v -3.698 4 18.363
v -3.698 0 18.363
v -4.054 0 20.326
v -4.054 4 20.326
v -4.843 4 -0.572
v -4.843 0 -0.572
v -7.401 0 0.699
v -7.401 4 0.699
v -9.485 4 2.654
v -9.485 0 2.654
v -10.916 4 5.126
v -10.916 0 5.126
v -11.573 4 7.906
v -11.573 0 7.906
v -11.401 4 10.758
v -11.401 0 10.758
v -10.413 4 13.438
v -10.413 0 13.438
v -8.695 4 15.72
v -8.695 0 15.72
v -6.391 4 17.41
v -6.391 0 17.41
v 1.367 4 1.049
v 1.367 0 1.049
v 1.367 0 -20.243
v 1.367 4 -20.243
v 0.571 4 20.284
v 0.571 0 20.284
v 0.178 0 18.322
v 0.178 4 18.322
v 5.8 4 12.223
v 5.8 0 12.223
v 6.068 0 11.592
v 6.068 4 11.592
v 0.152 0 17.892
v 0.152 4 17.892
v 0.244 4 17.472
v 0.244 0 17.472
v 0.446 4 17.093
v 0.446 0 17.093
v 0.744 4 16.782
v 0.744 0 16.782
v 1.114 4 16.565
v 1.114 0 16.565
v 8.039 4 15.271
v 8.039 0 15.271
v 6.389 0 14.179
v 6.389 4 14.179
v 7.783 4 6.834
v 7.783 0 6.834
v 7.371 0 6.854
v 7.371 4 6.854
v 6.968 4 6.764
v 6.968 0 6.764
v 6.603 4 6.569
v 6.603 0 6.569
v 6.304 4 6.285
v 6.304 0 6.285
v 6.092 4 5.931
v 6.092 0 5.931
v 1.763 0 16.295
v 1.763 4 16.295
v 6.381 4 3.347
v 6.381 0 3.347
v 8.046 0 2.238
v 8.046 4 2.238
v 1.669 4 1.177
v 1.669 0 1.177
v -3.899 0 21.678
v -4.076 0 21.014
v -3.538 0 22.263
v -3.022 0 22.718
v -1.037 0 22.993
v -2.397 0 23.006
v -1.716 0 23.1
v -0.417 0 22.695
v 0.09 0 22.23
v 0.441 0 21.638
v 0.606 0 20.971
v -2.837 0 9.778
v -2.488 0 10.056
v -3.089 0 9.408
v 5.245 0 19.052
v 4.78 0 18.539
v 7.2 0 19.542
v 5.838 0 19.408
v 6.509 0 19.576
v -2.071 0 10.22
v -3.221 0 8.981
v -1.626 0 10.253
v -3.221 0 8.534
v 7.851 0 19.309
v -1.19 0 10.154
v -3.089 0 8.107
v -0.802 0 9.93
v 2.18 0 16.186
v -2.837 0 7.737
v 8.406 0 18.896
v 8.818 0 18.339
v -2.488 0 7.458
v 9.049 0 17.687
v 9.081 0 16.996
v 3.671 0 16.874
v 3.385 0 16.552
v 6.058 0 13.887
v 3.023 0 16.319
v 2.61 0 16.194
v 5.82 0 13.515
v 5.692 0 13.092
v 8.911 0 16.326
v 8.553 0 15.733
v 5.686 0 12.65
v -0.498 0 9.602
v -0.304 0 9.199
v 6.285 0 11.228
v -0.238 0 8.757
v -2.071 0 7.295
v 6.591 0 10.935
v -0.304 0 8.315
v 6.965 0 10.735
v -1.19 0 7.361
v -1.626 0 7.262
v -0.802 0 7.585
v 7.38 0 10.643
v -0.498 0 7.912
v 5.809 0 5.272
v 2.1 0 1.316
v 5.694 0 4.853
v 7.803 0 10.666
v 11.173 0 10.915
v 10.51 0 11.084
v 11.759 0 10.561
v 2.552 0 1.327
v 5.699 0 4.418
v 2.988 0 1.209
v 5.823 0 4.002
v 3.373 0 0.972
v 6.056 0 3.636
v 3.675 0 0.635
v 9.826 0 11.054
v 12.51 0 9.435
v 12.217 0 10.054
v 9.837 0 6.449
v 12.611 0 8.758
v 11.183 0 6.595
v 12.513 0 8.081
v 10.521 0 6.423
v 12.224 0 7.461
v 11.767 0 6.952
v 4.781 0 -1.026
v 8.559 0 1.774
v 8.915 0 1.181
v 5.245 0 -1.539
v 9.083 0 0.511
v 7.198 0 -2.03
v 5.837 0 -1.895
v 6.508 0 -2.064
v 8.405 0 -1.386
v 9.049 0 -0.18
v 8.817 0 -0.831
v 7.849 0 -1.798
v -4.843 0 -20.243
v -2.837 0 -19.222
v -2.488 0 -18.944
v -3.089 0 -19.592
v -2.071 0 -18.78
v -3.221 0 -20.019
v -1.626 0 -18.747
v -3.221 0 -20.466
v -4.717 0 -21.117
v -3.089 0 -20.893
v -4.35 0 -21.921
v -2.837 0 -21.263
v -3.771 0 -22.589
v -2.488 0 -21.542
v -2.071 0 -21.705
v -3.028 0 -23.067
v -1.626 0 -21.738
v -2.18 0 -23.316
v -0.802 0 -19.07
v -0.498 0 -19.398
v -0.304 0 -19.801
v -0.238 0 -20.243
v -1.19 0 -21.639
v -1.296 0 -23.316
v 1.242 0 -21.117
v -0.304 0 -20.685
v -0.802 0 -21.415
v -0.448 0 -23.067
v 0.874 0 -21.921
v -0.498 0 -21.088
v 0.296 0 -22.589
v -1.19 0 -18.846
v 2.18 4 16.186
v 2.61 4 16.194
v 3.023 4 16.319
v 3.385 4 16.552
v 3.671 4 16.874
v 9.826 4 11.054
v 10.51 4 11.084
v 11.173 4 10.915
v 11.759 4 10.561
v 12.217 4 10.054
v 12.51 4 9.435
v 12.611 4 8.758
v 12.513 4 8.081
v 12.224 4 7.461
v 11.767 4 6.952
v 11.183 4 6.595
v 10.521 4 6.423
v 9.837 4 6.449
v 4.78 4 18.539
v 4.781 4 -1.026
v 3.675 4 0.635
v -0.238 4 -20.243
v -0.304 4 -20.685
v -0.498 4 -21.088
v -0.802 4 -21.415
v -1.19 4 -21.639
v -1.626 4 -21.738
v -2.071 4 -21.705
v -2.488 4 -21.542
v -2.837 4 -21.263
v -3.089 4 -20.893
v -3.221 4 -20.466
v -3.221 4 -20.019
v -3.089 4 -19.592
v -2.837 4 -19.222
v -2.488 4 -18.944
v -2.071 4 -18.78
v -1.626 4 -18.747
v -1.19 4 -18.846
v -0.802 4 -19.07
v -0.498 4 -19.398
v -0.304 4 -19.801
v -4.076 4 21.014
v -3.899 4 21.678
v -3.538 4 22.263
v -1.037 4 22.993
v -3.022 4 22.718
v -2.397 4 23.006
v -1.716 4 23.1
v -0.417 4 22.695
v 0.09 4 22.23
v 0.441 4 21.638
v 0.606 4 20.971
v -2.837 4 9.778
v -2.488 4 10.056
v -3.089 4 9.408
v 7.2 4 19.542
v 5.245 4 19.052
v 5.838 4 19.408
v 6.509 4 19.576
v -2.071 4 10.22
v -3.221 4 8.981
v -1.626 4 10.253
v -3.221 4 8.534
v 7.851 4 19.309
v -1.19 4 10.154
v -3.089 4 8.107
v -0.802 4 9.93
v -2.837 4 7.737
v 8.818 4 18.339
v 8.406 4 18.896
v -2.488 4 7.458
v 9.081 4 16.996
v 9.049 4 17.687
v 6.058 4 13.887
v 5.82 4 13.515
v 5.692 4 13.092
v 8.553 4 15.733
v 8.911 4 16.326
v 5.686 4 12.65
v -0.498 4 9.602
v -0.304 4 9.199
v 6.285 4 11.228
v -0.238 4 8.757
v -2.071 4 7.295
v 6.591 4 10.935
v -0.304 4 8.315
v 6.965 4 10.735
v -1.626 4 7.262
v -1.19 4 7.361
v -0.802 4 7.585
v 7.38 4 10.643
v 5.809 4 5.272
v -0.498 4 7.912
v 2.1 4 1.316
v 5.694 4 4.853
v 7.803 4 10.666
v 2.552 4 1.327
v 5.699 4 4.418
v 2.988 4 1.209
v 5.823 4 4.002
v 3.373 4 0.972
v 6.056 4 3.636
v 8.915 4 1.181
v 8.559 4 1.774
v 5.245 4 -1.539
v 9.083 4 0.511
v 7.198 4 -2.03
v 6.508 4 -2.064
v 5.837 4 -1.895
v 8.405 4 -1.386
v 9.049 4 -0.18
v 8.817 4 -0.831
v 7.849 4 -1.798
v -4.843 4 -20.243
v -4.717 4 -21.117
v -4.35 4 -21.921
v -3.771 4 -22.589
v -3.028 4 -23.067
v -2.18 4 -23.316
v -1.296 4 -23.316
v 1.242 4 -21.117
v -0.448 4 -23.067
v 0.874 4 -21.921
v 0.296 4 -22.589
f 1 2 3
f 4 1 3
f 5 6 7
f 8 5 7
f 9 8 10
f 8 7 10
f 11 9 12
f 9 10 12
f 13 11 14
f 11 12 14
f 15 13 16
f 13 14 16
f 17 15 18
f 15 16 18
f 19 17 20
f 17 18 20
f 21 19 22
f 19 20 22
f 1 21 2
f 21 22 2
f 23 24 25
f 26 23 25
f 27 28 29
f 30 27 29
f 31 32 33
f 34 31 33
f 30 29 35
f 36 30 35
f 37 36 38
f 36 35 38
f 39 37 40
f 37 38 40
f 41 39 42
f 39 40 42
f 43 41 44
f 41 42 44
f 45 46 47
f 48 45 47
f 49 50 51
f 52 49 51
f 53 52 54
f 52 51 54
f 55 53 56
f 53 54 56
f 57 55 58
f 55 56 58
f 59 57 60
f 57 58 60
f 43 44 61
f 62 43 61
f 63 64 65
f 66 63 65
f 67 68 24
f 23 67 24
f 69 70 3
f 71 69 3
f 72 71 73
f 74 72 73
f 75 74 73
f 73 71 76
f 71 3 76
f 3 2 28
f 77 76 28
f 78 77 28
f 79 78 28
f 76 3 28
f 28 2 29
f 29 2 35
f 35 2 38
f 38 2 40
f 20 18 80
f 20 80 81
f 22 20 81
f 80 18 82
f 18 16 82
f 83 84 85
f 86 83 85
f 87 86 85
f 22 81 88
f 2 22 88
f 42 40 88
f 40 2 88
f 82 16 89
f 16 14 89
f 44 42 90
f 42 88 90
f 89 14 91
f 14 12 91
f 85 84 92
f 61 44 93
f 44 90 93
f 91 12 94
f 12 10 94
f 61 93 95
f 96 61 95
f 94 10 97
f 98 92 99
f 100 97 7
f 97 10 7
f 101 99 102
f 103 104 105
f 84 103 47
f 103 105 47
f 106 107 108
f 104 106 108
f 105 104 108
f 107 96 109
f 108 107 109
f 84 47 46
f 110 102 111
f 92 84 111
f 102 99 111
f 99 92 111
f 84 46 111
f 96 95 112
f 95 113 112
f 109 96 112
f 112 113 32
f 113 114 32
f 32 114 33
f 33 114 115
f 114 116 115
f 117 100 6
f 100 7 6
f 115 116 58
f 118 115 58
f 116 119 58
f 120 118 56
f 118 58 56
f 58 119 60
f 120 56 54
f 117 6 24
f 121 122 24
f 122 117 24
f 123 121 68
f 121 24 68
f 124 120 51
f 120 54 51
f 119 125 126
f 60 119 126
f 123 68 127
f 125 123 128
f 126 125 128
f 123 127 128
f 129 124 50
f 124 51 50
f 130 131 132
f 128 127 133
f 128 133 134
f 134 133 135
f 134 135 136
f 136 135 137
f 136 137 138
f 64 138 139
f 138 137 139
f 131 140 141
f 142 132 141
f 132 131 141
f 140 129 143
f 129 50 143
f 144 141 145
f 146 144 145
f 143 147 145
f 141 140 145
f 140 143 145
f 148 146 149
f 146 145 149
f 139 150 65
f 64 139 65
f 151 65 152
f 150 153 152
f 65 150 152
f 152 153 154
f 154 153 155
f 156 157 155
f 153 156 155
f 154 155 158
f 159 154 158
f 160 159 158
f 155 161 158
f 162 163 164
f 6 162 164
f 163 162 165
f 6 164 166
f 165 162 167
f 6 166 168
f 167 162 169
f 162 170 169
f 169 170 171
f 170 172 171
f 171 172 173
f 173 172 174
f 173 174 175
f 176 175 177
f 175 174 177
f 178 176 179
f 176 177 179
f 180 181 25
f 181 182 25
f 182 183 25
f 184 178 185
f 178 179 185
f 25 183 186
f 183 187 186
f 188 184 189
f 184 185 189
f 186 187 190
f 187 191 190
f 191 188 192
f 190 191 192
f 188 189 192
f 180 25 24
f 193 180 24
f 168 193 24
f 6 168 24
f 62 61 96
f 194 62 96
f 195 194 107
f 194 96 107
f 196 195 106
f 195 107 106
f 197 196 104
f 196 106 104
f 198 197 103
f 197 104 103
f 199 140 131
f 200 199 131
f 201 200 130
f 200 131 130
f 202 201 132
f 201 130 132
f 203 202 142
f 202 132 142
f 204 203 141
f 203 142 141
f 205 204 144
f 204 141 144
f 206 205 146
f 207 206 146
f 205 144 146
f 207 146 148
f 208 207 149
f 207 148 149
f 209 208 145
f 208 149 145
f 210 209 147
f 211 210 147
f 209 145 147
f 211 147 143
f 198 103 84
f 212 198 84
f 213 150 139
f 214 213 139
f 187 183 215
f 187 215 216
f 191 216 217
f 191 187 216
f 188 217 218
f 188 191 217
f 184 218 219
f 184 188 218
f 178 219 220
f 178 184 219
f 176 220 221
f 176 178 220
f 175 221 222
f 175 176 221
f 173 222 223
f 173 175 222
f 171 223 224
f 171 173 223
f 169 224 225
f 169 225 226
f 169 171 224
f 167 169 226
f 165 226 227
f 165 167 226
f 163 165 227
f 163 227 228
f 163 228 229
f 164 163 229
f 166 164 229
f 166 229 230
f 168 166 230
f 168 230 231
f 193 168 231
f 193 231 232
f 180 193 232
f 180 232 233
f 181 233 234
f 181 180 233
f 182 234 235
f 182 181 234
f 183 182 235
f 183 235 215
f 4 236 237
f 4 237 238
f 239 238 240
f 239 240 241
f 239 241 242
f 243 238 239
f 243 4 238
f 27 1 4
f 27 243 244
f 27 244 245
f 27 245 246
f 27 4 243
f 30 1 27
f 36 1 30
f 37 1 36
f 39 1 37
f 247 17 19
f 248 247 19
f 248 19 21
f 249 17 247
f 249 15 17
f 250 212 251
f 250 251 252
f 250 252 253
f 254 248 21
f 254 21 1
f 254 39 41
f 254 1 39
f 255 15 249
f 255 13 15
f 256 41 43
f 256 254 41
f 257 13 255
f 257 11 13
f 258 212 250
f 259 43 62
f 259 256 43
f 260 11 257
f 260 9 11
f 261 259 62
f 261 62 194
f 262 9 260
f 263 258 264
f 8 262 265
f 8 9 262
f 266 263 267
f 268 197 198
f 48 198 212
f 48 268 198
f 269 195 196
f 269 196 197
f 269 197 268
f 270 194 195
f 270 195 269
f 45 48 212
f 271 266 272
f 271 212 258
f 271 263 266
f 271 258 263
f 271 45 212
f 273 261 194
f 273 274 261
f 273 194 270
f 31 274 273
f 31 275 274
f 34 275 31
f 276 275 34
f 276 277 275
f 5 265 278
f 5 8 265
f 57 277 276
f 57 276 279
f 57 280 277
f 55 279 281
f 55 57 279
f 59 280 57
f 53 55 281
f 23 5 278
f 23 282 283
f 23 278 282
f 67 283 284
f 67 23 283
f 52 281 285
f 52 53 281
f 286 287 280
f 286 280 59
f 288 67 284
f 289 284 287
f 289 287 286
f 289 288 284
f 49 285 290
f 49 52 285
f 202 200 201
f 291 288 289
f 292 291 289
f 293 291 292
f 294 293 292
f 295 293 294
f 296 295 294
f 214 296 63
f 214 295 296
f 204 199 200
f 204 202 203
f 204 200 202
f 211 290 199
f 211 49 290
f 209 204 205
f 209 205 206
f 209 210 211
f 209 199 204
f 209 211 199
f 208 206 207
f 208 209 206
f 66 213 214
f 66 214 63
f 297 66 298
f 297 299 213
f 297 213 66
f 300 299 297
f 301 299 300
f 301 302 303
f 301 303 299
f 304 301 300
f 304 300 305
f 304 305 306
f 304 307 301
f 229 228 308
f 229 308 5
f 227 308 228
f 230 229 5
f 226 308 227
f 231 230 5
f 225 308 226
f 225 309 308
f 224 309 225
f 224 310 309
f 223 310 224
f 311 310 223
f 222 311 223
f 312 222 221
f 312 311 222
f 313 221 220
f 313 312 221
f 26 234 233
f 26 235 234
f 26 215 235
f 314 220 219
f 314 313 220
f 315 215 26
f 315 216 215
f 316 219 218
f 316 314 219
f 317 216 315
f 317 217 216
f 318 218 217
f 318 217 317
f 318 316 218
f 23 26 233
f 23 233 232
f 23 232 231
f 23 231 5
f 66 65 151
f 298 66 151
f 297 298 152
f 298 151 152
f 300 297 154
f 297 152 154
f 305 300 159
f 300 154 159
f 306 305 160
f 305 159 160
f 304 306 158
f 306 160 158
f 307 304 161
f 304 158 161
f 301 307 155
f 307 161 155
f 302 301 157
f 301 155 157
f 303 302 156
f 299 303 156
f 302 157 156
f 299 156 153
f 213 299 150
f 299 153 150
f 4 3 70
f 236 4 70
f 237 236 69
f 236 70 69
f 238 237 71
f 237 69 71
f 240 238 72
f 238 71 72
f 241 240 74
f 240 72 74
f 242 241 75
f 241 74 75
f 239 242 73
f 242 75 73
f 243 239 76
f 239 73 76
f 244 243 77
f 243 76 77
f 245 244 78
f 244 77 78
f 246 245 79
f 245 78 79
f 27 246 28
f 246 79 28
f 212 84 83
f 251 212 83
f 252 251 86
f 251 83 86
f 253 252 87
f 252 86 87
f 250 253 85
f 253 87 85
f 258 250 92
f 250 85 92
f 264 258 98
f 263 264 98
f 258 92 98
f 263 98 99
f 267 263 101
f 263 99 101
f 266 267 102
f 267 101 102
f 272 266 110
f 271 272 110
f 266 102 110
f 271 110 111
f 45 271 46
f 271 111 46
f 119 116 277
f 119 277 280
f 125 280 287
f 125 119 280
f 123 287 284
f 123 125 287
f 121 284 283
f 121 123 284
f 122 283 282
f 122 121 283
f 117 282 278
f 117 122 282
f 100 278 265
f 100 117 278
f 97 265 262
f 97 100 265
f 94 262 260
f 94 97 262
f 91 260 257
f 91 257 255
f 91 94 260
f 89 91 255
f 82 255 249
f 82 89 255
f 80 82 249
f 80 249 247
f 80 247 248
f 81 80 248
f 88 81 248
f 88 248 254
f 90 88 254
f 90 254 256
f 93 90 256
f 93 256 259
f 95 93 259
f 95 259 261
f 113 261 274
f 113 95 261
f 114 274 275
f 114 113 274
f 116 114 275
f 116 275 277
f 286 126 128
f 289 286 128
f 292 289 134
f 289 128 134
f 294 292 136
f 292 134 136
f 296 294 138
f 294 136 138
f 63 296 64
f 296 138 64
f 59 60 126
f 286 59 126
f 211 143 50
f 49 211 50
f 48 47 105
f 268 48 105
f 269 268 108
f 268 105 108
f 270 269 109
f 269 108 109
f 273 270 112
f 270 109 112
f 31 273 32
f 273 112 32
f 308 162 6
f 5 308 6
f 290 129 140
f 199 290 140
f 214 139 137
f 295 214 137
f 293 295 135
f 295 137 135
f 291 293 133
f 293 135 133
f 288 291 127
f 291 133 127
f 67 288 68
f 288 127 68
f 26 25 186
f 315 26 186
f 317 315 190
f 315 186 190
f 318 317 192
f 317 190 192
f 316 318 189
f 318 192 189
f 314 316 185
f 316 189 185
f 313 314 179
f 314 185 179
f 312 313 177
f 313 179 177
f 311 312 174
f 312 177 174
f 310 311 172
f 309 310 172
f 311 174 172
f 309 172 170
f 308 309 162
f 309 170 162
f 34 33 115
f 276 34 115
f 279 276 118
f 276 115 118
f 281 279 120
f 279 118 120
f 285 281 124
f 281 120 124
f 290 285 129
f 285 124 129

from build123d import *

# Parameters (mm, degrees)
CROQUIS1_R              = 1.500000449
CROQUIS1_R_2            = 1.500000067
SALIENTE_EXTRUIR1_DEPTH = 4


with BuildPart() as part:
    # Croquis1 → Saliente-Extruir1 (new body)
    with BuildSketch(Plane(origin=(0, 0, 0), x_dir=(1, 0, 0), z_dir=(0, 1, 0))):
        with BuildLine():
            Line((7.803034841, -10.666075678), (9.826177161, -11.05442464))
            ThreePointArc((9.826177161, -11.05442464), (12.611497219, -8.758438746), (9.837059372, -6.449314739))
            Line((9.837059372, -6.449314739), (7.783190104, -6.83350636))
            ThreePointArc((7.783190104, -6.83350636), (6.778877321, -6.678958506), (6.091539896, -5.930562574))
            Line((6.091539896, -5.930562574), (5.8088579, -5.271694401))
            ThreePointArc((5.8088579, -5.271694401), (5.746747512, -4.205872048), (6.380859817, -3.346956119))
            Line((6.380859817, -3.346956119), (8.045875641, -2.237519038))
            ThreePointArc((8.045875641, -2.237519038), (8.404769789, 1.386225416), (4.781168268, 1.025891001))
            Line((4.781168268, 1.025891001), (3.675334506, -0.635147383))
            ThreePointArc((3.675334506, -0.635147383), (2.774259756, -1.283481634), (1.669267023, -1.177349334))
            Line((1.669267023, -1.177349334), (1.3673448, -1.048666977))
            Line((1.3673448, -1.048666977), (1.3673448, 20.24263647))
            ThreePointArc((1.3673448, 20.24263647), (-1.737654981, 23.347636251), (-4.842654762, 20.24263647))
            Line((-4.842654762, 20.24263647), (-4.842654762, 0.571999527))
            ThreePointArc((-4.842654762, 0.571999527), (-11.591302814, -9.338185795), (-3.698262021, -18.363479735))
            Line((-3.698262021, -18.363479735), (-4.053895188, -20.326281833))
            ThreePointArc((-4.053895188, -20.326281833), (-1.716098294, -23.09980655), (0.570509604, -20.283930489))
            Line((0.570509604, -20.283930489), (0.177742699, -18.321752082))
            ThreePointArc((0.177742699, -18.321752082), (0.331674177, -17.275555509), (1.114410942, -16.564538403))
            Line((1.114410942, -16.564538403), (1.762991063, -16.295067607))
            ThreePointArc((1.762991063, -16.295067607), (2.82080022, -16.242583246), (3.671047948, -16.874084331))
            Line((3.671047948, -16.874084331), (4.780498307, -18.539119038))
            ThreePointArc((4.780498307, -18.539119038), (8.406487962, -18.895762792), (8.038611241, -15.270895558))
            Line((8.038611241, -15.270895558), (6.389450023, -14.179385265))
            ThreePointArc((6.389450023, -14.179385265), (5.741374186, -13.307833185), (5.800109712, -12.223326174))
            Line((5.800109712, -12.223326174), (6.067644855, -11.592044841))
            ThreePointArc((6.067644855, -11.592044841), (6.771618308, -10.822224208), (7.803034841, -10.666075678))
        make_face()
        with Locations((-1.73765539, 20.242635654)):
            Circle(CROQUIS1_R, mode=Mode.SUBTRACT)
        with Locations((-1.737655616, -8.757364808)):
            Circle(CROQUIS1_R_2, mode=Mode.SUBTRACT)
    extrude(amount=SALIENTE_EXTRUIR1_DEPTH)


solid = part.part
